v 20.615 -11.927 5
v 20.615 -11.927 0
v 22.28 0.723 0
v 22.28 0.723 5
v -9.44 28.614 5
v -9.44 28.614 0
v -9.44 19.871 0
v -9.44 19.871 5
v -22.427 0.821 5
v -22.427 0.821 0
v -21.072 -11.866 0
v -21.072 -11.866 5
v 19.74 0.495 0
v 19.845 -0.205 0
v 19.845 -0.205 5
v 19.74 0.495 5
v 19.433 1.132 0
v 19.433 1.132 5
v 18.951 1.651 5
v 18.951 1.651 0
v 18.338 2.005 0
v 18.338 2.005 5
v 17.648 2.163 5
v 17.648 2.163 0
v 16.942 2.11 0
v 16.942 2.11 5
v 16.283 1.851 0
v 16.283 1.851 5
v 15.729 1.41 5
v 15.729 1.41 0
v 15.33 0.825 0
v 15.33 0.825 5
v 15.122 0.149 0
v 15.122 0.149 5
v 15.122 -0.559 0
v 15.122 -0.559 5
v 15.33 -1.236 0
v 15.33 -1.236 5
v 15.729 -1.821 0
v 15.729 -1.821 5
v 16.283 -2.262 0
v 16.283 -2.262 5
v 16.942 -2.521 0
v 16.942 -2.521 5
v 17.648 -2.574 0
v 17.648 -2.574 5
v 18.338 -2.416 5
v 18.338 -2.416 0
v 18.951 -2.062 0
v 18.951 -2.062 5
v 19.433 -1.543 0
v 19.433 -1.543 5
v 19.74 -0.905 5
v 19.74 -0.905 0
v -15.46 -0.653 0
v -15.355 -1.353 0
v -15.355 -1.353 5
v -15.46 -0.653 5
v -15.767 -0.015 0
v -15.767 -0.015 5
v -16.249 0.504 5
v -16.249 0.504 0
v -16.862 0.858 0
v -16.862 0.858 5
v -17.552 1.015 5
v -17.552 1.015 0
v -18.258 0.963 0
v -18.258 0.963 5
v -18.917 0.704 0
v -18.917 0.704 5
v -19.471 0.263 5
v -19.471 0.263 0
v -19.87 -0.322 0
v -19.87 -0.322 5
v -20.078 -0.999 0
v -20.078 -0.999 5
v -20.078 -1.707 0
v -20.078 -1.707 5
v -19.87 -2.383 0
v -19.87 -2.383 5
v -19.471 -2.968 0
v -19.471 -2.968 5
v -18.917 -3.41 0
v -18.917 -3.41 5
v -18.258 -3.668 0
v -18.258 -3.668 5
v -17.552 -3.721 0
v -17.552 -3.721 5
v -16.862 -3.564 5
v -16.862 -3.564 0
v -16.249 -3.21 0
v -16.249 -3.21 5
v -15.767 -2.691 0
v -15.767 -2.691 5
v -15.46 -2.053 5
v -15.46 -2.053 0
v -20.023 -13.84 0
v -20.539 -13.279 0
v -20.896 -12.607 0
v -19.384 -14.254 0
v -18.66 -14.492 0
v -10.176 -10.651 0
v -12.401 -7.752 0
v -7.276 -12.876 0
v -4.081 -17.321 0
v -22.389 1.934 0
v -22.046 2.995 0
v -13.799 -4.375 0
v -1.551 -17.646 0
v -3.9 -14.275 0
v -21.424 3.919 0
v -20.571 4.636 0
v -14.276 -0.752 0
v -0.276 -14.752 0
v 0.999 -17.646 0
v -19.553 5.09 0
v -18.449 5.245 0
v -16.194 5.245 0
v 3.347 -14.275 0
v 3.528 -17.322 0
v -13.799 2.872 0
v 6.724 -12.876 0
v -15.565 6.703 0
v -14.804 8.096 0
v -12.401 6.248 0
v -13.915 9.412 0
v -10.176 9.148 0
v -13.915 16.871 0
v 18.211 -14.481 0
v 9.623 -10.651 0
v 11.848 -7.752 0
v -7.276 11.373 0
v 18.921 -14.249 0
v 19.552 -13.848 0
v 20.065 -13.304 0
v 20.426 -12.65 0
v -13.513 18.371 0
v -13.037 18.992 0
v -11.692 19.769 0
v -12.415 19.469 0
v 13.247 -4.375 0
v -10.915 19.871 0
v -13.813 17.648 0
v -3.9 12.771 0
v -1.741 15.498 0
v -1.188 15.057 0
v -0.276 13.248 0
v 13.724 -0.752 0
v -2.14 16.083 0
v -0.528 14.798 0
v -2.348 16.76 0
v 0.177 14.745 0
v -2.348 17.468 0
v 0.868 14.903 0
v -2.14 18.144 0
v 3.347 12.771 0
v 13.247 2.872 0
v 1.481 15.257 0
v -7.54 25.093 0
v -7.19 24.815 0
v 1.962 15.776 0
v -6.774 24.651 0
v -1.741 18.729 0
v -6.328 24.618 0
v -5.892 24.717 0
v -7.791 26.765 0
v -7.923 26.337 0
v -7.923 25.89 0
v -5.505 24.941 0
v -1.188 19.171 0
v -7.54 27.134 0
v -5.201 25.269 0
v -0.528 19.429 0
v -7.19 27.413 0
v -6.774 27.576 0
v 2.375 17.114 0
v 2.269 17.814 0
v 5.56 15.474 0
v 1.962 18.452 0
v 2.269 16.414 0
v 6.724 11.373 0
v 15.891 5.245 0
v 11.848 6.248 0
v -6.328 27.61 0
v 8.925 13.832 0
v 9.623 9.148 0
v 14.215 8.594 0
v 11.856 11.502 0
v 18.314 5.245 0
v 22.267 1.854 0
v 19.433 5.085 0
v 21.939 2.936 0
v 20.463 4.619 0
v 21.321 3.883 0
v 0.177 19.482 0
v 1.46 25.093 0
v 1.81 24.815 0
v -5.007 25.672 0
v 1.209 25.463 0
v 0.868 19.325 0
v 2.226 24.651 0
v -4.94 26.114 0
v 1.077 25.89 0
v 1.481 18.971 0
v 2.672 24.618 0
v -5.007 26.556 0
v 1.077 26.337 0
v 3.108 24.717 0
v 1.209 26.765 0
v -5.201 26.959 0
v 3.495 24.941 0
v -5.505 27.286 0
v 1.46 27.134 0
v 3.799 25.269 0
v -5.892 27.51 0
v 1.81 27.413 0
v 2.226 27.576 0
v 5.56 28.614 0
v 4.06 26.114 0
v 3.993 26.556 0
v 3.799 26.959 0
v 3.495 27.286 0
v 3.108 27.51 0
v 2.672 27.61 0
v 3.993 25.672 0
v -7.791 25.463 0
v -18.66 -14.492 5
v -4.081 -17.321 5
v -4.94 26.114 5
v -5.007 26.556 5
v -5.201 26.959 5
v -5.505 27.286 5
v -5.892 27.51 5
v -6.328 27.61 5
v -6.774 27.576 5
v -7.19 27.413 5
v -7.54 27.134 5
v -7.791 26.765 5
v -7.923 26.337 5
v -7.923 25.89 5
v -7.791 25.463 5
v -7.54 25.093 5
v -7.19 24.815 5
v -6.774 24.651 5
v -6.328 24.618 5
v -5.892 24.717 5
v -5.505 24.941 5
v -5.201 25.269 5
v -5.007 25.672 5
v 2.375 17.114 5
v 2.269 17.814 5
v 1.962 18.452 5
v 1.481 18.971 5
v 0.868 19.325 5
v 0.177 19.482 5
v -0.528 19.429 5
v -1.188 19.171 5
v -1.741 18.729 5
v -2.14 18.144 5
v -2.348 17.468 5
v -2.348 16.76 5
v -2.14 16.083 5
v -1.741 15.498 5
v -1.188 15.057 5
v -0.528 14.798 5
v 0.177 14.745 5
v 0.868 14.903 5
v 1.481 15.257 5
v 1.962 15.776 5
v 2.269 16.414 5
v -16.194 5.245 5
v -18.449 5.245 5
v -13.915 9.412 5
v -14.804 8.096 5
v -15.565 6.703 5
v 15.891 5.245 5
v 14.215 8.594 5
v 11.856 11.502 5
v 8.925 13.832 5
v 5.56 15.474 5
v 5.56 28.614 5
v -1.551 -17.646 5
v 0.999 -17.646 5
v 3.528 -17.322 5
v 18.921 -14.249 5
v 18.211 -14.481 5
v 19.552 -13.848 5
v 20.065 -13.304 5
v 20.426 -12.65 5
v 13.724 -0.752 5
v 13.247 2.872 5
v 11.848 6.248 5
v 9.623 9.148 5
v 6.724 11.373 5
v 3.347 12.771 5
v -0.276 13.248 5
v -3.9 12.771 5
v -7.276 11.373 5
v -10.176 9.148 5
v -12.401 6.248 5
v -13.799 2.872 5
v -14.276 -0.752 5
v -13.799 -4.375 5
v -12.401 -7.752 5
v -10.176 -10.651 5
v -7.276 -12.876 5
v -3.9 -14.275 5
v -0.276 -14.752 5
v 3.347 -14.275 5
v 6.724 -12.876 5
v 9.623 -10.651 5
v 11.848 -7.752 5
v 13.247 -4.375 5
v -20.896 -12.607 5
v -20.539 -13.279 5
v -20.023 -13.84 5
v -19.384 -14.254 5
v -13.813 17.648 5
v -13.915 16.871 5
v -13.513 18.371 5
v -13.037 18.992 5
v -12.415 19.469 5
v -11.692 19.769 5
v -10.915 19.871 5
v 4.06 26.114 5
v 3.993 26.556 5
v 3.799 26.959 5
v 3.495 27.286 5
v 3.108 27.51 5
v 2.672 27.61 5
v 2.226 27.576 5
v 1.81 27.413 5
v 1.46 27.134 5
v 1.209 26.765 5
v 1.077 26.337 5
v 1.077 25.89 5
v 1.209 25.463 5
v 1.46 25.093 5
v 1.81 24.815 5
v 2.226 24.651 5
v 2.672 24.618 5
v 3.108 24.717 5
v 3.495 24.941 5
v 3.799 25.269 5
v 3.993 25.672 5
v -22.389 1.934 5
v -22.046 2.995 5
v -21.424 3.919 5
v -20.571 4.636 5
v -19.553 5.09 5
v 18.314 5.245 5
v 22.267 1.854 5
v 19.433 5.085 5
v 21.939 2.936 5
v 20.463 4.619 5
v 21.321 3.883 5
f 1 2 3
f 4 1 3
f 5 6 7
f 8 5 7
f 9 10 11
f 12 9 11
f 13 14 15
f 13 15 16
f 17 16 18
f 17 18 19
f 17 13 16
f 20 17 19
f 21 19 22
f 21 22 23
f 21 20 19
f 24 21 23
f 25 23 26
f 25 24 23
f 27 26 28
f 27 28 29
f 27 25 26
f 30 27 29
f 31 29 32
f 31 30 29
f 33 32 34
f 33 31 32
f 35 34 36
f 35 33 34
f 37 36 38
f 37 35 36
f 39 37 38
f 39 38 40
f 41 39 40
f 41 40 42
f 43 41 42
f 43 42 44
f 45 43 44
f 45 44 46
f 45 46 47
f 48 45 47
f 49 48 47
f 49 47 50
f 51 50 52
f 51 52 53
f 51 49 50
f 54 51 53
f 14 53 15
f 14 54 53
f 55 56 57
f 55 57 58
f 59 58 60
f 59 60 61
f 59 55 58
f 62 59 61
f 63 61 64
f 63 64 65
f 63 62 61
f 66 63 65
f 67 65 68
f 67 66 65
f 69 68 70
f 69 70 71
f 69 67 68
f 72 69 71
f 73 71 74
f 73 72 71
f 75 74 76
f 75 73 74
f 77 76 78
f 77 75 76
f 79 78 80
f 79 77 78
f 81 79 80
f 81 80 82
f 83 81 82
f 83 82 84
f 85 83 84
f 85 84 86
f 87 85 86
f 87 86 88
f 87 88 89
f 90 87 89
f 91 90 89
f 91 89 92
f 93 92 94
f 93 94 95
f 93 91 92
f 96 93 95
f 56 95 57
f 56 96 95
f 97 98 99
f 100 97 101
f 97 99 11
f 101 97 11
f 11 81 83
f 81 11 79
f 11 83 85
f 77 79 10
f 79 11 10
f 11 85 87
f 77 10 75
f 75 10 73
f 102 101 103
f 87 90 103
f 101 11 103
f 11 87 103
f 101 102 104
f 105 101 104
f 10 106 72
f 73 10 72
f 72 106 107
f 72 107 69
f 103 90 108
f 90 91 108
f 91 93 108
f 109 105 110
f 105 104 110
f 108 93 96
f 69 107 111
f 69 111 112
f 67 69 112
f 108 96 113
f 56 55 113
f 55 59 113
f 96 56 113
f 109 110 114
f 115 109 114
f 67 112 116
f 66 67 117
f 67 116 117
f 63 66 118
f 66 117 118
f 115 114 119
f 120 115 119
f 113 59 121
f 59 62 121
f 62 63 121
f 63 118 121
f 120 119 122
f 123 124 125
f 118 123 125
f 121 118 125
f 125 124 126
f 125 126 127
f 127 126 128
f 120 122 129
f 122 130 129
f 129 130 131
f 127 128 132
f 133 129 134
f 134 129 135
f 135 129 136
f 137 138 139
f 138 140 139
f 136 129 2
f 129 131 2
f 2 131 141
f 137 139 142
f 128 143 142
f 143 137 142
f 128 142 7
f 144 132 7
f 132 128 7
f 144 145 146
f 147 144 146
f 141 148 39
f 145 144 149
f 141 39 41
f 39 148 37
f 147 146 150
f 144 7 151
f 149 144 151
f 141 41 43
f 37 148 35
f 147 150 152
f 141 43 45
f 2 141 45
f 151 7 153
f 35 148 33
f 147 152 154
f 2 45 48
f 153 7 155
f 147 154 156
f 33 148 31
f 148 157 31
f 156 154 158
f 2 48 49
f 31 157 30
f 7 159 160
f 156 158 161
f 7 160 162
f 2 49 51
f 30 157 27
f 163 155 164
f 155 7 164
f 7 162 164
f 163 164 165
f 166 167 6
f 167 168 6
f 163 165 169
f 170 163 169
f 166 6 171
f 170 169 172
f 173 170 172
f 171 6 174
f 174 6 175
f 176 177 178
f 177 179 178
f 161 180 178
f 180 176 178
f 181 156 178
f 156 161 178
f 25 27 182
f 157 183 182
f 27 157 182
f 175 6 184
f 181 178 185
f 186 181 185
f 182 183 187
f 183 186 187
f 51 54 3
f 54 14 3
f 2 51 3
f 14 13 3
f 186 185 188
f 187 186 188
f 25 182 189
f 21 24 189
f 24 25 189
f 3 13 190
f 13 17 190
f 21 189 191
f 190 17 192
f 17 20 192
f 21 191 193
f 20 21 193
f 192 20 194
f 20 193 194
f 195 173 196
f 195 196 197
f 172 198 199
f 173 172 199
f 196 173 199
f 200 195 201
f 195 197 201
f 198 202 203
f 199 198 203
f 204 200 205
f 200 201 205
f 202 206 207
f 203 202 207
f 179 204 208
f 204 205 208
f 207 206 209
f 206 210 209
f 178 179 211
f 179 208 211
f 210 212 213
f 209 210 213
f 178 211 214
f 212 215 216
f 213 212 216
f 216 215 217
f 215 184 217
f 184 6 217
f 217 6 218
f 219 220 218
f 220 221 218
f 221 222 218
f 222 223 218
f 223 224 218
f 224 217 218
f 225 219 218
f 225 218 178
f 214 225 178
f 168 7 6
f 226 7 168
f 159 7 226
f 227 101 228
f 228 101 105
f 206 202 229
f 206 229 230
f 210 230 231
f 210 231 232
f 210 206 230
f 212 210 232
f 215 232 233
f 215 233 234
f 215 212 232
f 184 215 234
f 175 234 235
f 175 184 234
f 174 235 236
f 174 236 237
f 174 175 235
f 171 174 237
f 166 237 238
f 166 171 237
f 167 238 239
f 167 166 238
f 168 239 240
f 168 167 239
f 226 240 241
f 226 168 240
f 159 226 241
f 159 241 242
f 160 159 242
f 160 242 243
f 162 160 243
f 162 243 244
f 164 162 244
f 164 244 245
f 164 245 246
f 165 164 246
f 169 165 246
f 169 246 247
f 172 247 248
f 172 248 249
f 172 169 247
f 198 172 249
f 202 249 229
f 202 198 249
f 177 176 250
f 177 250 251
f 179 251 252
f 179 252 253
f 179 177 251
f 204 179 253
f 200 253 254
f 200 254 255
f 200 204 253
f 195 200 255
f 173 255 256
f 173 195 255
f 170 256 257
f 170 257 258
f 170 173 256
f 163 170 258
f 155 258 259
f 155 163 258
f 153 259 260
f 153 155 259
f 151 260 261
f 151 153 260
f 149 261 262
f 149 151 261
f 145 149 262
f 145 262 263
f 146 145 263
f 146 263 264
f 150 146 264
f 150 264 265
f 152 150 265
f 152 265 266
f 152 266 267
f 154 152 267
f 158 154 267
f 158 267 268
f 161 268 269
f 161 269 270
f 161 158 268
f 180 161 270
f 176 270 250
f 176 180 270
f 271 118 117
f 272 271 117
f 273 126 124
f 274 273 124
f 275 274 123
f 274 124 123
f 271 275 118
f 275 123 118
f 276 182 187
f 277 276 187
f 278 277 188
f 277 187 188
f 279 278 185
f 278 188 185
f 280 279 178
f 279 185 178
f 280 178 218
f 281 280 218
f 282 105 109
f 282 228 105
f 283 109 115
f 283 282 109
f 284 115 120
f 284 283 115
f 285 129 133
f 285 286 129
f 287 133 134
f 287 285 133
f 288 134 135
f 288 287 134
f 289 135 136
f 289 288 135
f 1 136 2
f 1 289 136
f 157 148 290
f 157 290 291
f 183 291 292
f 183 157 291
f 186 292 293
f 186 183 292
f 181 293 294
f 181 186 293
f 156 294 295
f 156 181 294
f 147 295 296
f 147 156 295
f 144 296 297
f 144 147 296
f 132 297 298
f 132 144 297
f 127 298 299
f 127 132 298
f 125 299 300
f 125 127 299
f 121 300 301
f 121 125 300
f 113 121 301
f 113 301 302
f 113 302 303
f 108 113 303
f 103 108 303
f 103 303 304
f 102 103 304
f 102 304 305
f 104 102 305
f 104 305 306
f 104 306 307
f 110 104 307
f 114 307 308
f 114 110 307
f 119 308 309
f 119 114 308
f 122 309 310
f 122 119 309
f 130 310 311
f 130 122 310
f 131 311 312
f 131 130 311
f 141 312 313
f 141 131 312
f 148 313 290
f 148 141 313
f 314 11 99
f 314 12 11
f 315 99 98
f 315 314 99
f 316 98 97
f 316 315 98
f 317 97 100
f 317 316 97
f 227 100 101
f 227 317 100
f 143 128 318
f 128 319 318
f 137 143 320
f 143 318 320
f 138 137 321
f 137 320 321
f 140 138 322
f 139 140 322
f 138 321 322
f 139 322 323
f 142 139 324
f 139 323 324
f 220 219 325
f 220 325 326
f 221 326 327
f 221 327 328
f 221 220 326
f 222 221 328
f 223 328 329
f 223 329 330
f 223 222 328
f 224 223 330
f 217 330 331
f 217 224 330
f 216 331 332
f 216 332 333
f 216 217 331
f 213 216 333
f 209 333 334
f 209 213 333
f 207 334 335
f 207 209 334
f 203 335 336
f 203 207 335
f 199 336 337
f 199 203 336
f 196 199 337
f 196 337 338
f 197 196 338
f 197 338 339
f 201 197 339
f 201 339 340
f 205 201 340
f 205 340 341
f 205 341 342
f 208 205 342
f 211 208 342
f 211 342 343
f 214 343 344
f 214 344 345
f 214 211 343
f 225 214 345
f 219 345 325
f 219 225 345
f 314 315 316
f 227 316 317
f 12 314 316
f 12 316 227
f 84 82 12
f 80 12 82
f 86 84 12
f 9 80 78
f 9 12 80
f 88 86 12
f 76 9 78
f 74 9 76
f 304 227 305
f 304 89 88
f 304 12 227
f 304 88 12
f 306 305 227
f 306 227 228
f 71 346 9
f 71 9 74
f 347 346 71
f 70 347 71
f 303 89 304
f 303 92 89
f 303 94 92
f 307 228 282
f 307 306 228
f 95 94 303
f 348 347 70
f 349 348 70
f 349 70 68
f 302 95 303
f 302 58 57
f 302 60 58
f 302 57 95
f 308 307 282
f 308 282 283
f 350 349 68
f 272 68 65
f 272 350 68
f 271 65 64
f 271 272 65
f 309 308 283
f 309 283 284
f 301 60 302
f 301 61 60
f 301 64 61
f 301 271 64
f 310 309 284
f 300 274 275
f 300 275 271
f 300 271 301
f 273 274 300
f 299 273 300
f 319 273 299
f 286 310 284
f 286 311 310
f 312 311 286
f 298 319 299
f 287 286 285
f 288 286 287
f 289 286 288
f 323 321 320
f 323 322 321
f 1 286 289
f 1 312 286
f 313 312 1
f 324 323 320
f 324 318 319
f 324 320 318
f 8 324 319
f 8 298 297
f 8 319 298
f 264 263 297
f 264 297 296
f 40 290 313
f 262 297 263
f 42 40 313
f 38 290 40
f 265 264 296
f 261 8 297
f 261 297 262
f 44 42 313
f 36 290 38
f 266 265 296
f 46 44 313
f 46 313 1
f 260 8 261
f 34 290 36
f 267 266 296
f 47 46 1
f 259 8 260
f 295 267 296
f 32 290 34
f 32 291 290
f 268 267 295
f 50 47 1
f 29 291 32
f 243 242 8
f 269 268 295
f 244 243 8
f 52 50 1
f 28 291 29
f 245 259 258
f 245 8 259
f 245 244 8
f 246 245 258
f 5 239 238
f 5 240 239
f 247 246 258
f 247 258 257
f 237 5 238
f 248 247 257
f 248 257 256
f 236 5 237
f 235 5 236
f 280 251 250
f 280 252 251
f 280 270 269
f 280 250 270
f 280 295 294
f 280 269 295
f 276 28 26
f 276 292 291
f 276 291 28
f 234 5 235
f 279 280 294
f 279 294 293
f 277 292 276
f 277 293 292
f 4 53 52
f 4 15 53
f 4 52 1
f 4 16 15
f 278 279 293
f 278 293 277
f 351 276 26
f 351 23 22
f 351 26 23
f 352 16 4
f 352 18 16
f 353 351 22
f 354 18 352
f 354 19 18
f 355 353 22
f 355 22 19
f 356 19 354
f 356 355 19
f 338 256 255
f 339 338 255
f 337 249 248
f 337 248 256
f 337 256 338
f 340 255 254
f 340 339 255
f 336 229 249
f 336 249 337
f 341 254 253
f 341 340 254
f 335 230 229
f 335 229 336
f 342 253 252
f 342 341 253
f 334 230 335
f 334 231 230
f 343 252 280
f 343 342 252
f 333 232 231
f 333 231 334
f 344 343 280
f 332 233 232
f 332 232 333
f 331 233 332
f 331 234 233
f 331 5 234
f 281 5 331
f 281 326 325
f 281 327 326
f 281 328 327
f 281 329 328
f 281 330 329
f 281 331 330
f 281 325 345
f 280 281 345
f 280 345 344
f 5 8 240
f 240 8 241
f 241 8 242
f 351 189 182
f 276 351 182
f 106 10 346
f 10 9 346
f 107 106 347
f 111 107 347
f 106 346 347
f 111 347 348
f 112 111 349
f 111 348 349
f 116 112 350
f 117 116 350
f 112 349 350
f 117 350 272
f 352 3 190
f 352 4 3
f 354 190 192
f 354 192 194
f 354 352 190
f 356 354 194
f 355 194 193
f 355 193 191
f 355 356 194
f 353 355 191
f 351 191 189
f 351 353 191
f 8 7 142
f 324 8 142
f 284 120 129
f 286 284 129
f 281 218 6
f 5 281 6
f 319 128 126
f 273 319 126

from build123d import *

# Parameters (mm, degrees)
SKETCH4_R           = 2.375
SKETCH4_R_2         = 14
SKETCH4_R_3         = 1.5
BOSS_EXTRUDE1_DEPTH = 5
FILLET1_R           = 4
FILLET2_R           = 3
FILLET3_R           = 20
FILLET4_R           = 3


with BuildPart() as part:
    # Sketch4 → Boss-Extrude1 (new body)
    with BuildSketch(Plane.XY):
        with BuildLine():
            Line((-22.898882881, 5.245209669), (-20.836749357, -14.070107669))
            Line((-20.836749357, -14.070107669), (-0.276312074, -18.058688738))
            Line((-0.276312074, -18.058688738), (20.333519642, -14.070107669))
            Line((20.333519642, -14.070107669), (22.874540819, 5.245209669))
            Line((22.874540819, 5.245209669), (15.890720179, 5.245209669))
            ThreePointArc((15.890720179, 5.245209669), (11.856045842, 11.501579149), (5.56, 15.474054805))
            Line((5.56, 15.474054805), (5.56, 28.613702828))
            Line((5.56, 28.613702828), (0, 28.613702828))
            Line((0, 28.613702828), (-9.44, 28.613702828))
            Line((-9.44, 28.613702828), (-9.44, 19.87109493))
            Line((-9.44, 19.87109493), (-13.915384187, 19.87109493))
            Line((-13.915384187, 19.87109493), (-13.915384187, 9.41227742))
            ThreePointArc((-13.915384187, 9.41227742), (-15.200754202, 7.408655363), (-16.193820238, 5.245209669))
            Line((-16.193820238, 5.245209669), (-22.898882881, 5.245209669))
        make_face()
        with Locations((-17.729765035, -1.352900319)):
            Circle(SKETCH4_R, mode=Mode.SUBTRACT)
        with Locations((0, 17.113702828)):
            Circle(SKETCH4_R, mode=Mode.SUBTRACT)
        with Locations((17.470234965, -0.205387514)):
            Circle(SKETCH4_R, mode=Mode.SUBTRACT)
        with Locations((-0.276312074, -0.751612004)):
            Circle(SKETCH4_R_2, mode=Mode.SUBTRACT)
        with Locations((-6.44, 26.113702828)):
            Circle(SKETCH4_R_3, mode=Mode.SUBTRACT)
        with Locations((2.56, 26.113702828)):
            Circle(SKETCH4_R_3, mode=Mode.SUBTRACT)
    extrude(amount=BOSS_EXTRUDE1_DEPTH)

    # Fillet1
    fillet1_edges = [part.edges().sort_by_distance(p)[0] for p in [
        (-22.898882881, 5.245209669, 2.5),
        (22.874540819, 5.245209669, 2.5),
    ]]
    fillet(fillet1_edges, radius=FILLET1_R)

    # Fillet2
    fillet2_edges = [part.edges().sort_by_distance(p)[0] for p in [
        (-20.836749357, -14.070107669, 2.5),
        (20.333519642, -14.070107669, 2.5),
    ]]
    fillet(fillet2_edges, radius=FILLET2_R)

    # Fillet3
    fillet3_edges = [part.edges().sort_by_distance(p)[0] for p in [
        (-0.276312074, -18.058688738, 2.5),
    ]]
    fillet(fillet3_edges, radius=FILLET3_R)

    # Fillet4
    fillet4_edges = [part.edges().sort_by_distance(p)[0] for p in [
        (-13.915384187, 19.87109493, 2.5),
    ]]
    fillet(fillet4_edges, radius=FILLET4_R)


solid = part.part
